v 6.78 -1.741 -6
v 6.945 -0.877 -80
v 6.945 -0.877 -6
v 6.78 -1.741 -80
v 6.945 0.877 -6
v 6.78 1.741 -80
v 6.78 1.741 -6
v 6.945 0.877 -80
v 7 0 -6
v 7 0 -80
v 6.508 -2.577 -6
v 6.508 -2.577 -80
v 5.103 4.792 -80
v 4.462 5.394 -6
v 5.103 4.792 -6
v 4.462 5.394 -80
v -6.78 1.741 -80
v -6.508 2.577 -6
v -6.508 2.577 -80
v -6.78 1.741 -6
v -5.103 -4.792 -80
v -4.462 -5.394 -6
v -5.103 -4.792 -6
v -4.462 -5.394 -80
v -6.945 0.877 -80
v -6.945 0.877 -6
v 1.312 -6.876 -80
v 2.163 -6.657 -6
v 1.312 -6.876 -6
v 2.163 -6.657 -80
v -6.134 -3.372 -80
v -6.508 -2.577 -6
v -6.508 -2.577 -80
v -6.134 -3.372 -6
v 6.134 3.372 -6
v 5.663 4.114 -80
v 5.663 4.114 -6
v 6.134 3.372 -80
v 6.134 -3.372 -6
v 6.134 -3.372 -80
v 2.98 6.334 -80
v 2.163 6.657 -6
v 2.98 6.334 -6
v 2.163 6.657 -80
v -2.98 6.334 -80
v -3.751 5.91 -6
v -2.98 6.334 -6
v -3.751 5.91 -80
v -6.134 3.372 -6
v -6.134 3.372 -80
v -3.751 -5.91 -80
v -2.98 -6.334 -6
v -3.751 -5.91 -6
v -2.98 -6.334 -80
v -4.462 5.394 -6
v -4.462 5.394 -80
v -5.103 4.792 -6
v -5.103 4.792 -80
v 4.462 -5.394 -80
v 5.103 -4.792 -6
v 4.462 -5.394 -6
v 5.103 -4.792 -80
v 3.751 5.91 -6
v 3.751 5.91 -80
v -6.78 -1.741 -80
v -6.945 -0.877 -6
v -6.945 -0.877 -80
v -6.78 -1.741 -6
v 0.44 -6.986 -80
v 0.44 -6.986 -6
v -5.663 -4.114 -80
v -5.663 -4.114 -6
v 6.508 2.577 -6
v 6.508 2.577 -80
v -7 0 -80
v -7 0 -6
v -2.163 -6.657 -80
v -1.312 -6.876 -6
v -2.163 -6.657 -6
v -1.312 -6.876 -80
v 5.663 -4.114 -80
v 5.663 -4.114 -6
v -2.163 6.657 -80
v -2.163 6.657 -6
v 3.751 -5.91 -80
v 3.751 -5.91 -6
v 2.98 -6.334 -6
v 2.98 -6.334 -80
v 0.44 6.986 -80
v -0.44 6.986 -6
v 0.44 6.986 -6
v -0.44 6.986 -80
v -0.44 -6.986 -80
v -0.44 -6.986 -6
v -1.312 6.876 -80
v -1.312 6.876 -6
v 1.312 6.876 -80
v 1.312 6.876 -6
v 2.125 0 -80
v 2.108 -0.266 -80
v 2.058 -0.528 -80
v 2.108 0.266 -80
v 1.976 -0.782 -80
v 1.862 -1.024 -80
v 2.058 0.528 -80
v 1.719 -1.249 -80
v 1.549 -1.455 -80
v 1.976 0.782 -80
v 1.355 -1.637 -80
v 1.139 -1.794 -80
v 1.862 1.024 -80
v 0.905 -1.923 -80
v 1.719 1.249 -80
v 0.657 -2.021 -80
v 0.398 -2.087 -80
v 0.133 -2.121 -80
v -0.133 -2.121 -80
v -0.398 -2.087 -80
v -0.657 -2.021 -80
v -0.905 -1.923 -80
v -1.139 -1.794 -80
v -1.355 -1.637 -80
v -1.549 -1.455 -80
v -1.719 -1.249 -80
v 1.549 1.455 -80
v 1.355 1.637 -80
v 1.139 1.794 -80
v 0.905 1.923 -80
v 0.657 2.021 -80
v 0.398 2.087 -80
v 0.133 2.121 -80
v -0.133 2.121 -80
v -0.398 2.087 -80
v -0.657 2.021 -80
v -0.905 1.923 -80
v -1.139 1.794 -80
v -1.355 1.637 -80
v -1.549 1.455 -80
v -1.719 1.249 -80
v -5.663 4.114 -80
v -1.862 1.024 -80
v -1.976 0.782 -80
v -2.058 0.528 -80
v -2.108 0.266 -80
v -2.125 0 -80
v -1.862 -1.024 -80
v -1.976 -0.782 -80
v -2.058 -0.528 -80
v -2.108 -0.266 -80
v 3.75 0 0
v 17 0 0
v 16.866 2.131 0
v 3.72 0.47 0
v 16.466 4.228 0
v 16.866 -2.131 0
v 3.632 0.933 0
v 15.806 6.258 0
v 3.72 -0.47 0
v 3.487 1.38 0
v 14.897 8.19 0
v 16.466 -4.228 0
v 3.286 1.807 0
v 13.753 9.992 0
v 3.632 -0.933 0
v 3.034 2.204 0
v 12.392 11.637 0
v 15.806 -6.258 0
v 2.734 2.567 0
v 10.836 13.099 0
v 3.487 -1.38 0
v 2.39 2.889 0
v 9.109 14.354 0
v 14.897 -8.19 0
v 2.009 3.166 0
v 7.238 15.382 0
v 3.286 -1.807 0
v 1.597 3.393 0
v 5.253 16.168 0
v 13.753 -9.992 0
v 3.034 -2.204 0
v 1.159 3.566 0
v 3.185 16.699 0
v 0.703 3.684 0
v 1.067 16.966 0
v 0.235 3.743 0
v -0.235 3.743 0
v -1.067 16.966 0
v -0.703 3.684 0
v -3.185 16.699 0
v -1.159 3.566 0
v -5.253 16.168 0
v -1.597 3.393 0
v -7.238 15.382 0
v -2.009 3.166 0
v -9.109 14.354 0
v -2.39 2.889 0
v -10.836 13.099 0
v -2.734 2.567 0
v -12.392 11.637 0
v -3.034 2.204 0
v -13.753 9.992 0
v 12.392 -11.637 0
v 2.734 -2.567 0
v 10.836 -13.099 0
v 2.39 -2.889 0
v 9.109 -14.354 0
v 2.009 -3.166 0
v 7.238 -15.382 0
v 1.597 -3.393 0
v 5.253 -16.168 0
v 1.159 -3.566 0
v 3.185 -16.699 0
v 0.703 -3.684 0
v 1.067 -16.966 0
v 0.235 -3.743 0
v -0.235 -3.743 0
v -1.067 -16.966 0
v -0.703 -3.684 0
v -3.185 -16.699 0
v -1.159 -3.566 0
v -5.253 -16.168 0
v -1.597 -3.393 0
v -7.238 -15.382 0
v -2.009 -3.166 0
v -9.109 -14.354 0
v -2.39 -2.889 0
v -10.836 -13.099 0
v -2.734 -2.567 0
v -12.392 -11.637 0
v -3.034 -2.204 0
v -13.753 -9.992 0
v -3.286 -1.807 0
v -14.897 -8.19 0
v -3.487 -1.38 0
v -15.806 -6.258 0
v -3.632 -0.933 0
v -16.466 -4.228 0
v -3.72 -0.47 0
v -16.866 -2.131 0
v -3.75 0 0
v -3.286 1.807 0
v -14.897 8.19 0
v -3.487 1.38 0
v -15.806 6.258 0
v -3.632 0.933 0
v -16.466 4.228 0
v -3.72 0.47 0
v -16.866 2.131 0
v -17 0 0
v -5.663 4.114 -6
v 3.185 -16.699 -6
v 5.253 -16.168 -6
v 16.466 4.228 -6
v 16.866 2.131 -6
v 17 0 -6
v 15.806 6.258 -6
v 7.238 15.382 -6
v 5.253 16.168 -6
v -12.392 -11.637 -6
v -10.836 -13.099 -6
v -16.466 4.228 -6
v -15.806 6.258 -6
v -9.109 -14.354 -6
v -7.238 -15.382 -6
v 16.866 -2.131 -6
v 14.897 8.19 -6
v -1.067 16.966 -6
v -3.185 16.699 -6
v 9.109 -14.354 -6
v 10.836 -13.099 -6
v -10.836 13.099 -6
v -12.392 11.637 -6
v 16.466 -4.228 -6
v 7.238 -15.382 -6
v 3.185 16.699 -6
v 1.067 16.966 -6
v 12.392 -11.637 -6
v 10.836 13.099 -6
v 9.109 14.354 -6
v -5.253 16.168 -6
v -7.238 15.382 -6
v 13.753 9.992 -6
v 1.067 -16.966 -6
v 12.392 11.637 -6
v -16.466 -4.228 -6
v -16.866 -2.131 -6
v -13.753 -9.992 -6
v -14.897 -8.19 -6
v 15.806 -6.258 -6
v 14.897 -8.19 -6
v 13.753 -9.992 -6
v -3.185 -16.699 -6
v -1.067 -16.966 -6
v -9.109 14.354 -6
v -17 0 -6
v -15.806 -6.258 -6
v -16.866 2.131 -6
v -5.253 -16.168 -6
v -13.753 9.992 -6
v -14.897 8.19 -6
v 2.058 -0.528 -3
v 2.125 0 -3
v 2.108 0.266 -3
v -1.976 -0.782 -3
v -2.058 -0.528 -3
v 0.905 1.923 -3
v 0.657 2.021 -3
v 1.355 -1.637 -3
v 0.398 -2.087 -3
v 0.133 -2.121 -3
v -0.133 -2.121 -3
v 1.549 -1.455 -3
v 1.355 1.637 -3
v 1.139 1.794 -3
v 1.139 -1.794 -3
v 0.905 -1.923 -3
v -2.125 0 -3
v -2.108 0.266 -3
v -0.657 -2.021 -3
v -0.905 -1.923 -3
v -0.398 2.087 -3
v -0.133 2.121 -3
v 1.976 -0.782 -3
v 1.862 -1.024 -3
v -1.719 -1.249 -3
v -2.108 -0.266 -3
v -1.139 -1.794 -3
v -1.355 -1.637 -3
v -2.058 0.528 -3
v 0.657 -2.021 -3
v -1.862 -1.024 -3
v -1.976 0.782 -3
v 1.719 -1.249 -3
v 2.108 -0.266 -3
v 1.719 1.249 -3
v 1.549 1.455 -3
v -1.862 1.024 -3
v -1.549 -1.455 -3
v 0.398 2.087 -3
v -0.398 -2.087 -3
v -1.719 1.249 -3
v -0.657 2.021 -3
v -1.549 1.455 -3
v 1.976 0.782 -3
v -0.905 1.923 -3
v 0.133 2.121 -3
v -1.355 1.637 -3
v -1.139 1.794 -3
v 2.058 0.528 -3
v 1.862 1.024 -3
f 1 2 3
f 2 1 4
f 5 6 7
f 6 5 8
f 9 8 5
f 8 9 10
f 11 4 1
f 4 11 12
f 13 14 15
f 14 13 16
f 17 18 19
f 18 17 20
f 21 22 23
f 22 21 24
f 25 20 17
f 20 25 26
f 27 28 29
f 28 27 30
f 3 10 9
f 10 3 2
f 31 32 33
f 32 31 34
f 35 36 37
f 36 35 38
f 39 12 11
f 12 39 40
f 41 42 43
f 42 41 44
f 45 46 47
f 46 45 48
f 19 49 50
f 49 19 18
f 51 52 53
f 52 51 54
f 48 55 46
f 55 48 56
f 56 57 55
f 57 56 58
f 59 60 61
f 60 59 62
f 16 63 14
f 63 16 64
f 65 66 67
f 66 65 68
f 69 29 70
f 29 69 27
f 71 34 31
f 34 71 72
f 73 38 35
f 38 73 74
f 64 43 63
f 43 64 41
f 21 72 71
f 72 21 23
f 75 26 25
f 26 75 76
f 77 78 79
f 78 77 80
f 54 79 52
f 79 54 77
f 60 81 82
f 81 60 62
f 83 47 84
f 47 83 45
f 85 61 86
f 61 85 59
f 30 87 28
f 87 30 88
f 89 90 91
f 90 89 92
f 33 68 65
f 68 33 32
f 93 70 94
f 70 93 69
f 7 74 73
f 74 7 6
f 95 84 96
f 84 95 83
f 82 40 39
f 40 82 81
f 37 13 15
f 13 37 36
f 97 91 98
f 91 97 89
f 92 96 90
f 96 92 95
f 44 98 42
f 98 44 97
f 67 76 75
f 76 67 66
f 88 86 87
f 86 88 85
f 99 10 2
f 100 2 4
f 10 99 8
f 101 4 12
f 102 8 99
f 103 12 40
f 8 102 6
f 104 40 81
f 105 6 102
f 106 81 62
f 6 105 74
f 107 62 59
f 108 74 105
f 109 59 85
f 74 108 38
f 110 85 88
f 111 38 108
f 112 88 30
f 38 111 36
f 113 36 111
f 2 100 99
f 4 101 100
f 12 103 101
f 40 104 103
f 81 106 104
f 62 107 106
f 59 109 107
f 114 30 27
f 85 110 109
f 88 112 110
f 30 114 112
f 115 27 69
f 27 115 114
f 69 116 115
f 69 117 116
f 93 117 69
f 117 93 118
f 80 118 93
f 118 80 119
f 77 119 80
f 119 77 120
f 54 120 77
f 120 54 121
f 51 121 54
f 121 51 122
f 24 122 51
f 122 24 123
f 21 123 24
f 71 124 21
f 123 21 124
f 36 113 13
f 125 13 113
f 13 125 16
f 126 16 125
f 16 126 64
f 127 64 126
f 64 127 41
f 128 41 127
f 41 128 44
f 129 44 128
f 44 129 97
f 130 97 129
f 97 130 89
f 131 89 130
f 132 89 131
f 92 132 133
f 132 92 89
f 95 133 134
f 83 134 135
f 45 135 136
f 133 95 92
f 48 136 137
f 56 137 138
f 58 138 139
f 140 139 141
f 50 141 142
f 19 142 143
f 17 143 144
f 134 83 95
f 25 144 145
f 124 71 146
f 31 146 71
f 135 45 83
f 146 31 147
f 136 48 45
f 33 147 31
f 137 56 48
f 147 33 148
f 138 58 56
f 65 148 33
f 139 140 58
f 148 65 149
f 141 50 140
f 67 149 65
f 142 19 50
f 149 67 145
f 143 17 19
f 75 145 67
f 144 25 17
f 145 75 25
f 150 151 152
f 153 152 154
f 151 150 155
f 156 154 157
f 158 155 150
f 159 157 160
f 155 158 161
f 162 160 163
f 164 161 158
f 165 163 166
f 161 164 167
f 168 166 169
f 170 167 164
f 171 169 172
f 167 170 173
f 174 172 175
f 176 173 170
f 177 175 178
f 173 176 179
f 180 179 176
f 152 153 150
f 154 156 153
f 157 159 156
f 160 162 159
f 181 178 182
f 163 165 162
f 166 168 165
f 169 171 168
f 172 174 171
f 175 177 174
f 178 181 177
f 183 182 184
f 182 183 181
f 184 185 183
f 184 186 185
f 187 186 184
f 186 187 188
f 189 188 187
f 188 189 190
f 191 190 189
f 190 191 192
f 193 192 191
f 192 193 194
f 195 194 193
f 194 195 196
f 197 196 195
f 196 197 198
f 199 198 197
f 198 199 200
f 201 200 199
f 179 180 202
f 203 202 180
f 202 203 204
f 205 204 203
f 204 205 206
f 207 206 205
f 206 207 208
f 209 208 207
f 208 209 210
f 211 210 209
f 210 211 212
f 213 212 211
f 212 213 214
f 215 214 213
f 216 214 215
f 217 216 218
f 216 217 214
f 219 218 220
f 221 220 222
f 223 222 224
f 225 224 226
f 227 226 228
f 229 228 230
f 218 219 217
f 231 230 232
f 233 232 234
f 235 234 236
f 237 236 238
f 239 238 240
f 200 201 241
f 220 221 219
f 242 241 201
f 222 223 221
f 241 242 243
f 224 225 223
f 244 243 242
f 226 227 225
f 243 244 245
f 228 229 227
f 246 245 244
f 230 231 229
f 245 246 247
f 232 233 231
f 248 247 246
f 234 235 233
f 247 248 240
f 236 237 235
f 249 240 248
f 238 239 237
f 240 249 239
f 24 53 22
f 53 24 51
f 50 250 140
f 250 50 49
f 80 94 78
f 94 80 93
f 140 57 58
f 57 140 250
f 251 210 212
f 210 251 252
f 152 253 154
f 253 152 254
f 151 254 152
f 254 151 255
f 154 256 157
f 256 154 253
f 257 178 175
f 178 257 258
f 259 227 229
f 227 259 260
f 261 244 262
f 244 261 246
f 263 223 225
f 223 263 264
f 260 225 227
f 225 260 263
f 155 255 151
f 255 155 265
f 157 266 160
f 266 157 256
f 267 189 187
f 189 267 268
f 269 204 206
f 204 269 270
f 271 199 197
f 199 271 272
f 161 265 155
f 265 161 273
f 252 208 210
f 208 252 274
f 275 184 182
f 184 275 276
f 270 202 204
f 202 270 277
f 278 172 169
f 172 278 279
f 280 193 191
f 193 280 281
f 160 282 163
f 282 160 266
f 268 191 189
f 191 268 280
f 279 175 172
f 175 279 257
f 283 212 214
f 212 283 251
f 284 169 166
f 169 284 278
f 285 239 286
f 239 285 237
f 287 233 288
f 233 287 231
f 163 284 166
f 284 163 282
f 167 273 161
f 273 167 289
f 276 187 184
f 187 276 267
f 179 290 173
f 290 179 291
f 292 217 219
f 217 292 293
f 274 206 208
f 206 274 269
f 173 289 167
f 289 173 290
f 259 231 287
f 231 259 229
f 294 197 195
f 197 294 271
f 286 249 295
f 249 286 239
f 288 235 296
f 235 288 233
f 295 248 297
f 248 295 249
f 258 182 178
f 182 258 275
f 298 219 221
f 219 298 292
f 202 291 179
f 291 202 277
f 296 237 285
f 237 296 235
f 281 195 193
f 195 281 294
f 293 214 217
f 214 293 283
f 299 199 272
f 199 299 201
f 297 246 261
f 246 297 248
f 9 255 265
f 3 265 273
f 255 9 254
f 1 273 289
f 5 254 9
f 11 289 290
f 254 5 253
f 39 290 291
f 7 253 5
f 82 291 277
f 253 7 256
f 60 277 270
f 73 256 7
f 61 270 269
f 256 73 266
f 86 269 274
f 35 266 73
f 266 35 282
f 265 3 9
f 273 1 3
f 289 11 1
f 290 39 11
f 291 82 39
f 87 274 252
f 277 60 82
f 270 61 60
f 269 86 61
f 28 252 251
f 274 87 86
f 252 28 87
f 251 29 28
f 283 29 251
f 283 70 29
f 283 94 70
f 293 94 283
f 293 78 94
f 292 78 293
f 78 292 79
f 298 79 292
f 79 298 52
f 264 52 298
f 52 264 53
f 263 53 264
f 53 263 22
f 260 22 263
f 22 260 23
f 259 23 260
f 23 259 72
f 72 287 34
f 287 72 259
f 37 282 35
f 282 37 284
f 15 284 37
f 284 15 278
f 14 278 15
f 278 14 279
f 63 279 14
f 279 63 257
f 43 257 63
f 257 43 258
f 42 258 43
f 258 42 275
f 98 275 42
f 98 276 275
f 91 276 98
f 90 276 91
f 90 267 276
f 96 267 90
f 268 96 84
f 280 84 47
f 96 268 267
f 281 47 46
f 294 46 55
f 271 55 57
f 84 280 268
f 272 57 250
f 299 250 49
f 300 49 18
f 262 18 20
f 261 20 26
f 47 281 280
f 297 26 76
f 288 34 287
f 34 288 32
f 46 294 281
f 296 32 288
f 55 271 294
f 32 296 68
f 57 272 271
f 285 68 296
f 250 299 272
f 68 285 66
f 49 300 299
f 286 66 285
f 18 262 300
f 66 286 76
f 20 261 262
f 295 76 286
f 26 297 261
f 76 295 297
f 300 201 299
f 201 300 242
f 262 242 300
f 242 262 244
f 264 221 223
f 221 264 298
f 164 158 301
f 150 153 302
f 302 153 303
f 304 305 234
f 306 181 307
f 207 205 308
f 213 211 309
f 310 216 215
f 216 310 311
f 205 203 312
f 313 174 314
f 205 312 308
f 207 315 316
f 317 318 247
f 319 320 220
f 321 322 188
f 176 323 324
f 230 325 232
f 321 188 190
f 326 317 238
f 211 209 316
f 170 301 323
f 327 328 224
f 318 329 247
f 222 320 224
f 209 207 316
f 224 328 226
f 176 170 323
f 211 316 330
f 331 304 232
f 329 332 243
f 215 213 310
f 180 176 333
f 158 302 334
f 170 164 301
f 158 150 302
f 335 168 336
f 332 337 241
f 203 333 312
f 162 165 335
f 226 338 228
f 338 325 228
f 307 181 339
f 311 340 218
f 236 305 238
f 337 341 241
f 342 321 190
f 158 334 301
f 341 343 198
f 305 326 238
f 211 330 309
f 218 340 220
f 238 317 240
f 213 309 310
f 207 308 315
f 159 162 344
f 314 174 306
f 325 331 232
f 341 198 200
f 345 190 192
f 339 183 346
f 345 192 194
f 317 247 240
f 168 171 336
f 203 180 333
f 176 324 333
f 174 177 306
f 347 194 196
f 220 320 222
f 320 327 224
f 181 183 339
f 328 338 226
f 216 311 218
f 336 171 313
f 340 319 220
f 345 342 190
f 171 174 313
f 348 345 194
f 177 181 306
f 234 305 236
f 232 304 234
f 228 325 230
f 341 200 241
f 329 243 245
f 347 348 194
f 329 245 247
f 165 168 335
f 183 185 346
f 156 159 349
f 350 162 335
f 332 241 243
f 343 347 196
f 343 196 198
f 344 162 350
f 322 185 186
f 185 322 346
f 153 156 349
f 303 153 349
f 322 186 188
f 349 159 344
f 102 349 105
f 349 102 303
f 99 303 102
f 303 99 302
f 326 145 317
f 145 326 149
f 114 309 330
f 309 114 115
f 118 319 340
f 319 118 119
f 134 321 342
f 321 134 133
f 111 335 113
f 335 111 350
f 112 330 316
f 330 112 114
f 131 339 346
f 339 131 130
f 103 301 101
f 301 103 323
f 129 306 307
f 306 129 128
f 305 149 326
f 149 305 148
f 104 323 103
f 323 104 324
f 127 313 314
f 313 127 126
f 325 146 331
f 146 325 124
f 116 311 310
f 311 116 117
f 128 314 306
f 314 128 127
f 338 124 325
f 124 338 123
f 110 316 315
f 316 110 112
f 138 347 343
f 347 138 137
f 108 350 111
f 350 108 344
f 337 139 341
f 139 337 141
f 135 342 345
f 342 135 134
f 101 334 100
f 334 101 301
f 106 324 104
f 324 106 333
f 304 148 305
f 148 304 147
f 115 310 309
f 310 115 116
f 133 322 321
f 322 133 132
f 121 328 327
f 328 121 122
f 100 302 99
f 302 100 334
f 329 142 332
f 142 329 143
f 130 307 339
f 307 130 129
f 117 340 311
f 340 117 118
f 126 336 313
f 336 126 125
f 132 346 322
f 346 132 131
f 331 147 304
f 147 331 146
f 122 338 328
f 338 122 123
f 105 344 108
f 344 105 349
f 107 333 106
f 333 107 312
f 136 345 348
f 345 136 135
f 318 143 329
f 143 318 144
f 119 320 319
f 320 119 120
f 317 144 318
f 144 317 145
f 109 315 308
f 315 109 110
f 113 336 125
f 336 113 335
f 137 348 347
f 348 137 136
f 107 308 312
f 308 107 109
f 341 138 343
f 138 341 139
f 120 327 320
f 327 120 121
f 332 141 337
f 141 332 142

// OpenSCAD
$fn = 50;


difference() {
	union() {
		translate(v = [0, 0, -80.0000000000]) {
			cylinder(h = 80, r = 7.0000000000);
		}
		translate(v = [0, 0, -6.0000000000]) {
			cylinder(h = 6, r = 17.0000000000);
		}
	}
	union() {
		translate(v = [0, 0, 0]) {
			rotate(a = [0, 0, 0]) {
				difference() {
					union() {
						#translate(v = [0, 0, -80.0000000000]) {
							cylinder(h = 80, r = 2.0000000000);
						}
						#translate(v = [0, 0, -3]) {
							cylinder(h = 3, r1 = 2.1250000000, r2 = 3.7500000000);
						}
						#translate(v = [0, 0, -80.0000000000]) {
							cylinder(h = 80, r = 2.1250000000);
						}
						#translate(v = [0, 0, -80.0000000000]) {
							cylinder(h = 80, r = 2.0000000000);
						}
					}
					union();
				}
			}
		}
	}
}
